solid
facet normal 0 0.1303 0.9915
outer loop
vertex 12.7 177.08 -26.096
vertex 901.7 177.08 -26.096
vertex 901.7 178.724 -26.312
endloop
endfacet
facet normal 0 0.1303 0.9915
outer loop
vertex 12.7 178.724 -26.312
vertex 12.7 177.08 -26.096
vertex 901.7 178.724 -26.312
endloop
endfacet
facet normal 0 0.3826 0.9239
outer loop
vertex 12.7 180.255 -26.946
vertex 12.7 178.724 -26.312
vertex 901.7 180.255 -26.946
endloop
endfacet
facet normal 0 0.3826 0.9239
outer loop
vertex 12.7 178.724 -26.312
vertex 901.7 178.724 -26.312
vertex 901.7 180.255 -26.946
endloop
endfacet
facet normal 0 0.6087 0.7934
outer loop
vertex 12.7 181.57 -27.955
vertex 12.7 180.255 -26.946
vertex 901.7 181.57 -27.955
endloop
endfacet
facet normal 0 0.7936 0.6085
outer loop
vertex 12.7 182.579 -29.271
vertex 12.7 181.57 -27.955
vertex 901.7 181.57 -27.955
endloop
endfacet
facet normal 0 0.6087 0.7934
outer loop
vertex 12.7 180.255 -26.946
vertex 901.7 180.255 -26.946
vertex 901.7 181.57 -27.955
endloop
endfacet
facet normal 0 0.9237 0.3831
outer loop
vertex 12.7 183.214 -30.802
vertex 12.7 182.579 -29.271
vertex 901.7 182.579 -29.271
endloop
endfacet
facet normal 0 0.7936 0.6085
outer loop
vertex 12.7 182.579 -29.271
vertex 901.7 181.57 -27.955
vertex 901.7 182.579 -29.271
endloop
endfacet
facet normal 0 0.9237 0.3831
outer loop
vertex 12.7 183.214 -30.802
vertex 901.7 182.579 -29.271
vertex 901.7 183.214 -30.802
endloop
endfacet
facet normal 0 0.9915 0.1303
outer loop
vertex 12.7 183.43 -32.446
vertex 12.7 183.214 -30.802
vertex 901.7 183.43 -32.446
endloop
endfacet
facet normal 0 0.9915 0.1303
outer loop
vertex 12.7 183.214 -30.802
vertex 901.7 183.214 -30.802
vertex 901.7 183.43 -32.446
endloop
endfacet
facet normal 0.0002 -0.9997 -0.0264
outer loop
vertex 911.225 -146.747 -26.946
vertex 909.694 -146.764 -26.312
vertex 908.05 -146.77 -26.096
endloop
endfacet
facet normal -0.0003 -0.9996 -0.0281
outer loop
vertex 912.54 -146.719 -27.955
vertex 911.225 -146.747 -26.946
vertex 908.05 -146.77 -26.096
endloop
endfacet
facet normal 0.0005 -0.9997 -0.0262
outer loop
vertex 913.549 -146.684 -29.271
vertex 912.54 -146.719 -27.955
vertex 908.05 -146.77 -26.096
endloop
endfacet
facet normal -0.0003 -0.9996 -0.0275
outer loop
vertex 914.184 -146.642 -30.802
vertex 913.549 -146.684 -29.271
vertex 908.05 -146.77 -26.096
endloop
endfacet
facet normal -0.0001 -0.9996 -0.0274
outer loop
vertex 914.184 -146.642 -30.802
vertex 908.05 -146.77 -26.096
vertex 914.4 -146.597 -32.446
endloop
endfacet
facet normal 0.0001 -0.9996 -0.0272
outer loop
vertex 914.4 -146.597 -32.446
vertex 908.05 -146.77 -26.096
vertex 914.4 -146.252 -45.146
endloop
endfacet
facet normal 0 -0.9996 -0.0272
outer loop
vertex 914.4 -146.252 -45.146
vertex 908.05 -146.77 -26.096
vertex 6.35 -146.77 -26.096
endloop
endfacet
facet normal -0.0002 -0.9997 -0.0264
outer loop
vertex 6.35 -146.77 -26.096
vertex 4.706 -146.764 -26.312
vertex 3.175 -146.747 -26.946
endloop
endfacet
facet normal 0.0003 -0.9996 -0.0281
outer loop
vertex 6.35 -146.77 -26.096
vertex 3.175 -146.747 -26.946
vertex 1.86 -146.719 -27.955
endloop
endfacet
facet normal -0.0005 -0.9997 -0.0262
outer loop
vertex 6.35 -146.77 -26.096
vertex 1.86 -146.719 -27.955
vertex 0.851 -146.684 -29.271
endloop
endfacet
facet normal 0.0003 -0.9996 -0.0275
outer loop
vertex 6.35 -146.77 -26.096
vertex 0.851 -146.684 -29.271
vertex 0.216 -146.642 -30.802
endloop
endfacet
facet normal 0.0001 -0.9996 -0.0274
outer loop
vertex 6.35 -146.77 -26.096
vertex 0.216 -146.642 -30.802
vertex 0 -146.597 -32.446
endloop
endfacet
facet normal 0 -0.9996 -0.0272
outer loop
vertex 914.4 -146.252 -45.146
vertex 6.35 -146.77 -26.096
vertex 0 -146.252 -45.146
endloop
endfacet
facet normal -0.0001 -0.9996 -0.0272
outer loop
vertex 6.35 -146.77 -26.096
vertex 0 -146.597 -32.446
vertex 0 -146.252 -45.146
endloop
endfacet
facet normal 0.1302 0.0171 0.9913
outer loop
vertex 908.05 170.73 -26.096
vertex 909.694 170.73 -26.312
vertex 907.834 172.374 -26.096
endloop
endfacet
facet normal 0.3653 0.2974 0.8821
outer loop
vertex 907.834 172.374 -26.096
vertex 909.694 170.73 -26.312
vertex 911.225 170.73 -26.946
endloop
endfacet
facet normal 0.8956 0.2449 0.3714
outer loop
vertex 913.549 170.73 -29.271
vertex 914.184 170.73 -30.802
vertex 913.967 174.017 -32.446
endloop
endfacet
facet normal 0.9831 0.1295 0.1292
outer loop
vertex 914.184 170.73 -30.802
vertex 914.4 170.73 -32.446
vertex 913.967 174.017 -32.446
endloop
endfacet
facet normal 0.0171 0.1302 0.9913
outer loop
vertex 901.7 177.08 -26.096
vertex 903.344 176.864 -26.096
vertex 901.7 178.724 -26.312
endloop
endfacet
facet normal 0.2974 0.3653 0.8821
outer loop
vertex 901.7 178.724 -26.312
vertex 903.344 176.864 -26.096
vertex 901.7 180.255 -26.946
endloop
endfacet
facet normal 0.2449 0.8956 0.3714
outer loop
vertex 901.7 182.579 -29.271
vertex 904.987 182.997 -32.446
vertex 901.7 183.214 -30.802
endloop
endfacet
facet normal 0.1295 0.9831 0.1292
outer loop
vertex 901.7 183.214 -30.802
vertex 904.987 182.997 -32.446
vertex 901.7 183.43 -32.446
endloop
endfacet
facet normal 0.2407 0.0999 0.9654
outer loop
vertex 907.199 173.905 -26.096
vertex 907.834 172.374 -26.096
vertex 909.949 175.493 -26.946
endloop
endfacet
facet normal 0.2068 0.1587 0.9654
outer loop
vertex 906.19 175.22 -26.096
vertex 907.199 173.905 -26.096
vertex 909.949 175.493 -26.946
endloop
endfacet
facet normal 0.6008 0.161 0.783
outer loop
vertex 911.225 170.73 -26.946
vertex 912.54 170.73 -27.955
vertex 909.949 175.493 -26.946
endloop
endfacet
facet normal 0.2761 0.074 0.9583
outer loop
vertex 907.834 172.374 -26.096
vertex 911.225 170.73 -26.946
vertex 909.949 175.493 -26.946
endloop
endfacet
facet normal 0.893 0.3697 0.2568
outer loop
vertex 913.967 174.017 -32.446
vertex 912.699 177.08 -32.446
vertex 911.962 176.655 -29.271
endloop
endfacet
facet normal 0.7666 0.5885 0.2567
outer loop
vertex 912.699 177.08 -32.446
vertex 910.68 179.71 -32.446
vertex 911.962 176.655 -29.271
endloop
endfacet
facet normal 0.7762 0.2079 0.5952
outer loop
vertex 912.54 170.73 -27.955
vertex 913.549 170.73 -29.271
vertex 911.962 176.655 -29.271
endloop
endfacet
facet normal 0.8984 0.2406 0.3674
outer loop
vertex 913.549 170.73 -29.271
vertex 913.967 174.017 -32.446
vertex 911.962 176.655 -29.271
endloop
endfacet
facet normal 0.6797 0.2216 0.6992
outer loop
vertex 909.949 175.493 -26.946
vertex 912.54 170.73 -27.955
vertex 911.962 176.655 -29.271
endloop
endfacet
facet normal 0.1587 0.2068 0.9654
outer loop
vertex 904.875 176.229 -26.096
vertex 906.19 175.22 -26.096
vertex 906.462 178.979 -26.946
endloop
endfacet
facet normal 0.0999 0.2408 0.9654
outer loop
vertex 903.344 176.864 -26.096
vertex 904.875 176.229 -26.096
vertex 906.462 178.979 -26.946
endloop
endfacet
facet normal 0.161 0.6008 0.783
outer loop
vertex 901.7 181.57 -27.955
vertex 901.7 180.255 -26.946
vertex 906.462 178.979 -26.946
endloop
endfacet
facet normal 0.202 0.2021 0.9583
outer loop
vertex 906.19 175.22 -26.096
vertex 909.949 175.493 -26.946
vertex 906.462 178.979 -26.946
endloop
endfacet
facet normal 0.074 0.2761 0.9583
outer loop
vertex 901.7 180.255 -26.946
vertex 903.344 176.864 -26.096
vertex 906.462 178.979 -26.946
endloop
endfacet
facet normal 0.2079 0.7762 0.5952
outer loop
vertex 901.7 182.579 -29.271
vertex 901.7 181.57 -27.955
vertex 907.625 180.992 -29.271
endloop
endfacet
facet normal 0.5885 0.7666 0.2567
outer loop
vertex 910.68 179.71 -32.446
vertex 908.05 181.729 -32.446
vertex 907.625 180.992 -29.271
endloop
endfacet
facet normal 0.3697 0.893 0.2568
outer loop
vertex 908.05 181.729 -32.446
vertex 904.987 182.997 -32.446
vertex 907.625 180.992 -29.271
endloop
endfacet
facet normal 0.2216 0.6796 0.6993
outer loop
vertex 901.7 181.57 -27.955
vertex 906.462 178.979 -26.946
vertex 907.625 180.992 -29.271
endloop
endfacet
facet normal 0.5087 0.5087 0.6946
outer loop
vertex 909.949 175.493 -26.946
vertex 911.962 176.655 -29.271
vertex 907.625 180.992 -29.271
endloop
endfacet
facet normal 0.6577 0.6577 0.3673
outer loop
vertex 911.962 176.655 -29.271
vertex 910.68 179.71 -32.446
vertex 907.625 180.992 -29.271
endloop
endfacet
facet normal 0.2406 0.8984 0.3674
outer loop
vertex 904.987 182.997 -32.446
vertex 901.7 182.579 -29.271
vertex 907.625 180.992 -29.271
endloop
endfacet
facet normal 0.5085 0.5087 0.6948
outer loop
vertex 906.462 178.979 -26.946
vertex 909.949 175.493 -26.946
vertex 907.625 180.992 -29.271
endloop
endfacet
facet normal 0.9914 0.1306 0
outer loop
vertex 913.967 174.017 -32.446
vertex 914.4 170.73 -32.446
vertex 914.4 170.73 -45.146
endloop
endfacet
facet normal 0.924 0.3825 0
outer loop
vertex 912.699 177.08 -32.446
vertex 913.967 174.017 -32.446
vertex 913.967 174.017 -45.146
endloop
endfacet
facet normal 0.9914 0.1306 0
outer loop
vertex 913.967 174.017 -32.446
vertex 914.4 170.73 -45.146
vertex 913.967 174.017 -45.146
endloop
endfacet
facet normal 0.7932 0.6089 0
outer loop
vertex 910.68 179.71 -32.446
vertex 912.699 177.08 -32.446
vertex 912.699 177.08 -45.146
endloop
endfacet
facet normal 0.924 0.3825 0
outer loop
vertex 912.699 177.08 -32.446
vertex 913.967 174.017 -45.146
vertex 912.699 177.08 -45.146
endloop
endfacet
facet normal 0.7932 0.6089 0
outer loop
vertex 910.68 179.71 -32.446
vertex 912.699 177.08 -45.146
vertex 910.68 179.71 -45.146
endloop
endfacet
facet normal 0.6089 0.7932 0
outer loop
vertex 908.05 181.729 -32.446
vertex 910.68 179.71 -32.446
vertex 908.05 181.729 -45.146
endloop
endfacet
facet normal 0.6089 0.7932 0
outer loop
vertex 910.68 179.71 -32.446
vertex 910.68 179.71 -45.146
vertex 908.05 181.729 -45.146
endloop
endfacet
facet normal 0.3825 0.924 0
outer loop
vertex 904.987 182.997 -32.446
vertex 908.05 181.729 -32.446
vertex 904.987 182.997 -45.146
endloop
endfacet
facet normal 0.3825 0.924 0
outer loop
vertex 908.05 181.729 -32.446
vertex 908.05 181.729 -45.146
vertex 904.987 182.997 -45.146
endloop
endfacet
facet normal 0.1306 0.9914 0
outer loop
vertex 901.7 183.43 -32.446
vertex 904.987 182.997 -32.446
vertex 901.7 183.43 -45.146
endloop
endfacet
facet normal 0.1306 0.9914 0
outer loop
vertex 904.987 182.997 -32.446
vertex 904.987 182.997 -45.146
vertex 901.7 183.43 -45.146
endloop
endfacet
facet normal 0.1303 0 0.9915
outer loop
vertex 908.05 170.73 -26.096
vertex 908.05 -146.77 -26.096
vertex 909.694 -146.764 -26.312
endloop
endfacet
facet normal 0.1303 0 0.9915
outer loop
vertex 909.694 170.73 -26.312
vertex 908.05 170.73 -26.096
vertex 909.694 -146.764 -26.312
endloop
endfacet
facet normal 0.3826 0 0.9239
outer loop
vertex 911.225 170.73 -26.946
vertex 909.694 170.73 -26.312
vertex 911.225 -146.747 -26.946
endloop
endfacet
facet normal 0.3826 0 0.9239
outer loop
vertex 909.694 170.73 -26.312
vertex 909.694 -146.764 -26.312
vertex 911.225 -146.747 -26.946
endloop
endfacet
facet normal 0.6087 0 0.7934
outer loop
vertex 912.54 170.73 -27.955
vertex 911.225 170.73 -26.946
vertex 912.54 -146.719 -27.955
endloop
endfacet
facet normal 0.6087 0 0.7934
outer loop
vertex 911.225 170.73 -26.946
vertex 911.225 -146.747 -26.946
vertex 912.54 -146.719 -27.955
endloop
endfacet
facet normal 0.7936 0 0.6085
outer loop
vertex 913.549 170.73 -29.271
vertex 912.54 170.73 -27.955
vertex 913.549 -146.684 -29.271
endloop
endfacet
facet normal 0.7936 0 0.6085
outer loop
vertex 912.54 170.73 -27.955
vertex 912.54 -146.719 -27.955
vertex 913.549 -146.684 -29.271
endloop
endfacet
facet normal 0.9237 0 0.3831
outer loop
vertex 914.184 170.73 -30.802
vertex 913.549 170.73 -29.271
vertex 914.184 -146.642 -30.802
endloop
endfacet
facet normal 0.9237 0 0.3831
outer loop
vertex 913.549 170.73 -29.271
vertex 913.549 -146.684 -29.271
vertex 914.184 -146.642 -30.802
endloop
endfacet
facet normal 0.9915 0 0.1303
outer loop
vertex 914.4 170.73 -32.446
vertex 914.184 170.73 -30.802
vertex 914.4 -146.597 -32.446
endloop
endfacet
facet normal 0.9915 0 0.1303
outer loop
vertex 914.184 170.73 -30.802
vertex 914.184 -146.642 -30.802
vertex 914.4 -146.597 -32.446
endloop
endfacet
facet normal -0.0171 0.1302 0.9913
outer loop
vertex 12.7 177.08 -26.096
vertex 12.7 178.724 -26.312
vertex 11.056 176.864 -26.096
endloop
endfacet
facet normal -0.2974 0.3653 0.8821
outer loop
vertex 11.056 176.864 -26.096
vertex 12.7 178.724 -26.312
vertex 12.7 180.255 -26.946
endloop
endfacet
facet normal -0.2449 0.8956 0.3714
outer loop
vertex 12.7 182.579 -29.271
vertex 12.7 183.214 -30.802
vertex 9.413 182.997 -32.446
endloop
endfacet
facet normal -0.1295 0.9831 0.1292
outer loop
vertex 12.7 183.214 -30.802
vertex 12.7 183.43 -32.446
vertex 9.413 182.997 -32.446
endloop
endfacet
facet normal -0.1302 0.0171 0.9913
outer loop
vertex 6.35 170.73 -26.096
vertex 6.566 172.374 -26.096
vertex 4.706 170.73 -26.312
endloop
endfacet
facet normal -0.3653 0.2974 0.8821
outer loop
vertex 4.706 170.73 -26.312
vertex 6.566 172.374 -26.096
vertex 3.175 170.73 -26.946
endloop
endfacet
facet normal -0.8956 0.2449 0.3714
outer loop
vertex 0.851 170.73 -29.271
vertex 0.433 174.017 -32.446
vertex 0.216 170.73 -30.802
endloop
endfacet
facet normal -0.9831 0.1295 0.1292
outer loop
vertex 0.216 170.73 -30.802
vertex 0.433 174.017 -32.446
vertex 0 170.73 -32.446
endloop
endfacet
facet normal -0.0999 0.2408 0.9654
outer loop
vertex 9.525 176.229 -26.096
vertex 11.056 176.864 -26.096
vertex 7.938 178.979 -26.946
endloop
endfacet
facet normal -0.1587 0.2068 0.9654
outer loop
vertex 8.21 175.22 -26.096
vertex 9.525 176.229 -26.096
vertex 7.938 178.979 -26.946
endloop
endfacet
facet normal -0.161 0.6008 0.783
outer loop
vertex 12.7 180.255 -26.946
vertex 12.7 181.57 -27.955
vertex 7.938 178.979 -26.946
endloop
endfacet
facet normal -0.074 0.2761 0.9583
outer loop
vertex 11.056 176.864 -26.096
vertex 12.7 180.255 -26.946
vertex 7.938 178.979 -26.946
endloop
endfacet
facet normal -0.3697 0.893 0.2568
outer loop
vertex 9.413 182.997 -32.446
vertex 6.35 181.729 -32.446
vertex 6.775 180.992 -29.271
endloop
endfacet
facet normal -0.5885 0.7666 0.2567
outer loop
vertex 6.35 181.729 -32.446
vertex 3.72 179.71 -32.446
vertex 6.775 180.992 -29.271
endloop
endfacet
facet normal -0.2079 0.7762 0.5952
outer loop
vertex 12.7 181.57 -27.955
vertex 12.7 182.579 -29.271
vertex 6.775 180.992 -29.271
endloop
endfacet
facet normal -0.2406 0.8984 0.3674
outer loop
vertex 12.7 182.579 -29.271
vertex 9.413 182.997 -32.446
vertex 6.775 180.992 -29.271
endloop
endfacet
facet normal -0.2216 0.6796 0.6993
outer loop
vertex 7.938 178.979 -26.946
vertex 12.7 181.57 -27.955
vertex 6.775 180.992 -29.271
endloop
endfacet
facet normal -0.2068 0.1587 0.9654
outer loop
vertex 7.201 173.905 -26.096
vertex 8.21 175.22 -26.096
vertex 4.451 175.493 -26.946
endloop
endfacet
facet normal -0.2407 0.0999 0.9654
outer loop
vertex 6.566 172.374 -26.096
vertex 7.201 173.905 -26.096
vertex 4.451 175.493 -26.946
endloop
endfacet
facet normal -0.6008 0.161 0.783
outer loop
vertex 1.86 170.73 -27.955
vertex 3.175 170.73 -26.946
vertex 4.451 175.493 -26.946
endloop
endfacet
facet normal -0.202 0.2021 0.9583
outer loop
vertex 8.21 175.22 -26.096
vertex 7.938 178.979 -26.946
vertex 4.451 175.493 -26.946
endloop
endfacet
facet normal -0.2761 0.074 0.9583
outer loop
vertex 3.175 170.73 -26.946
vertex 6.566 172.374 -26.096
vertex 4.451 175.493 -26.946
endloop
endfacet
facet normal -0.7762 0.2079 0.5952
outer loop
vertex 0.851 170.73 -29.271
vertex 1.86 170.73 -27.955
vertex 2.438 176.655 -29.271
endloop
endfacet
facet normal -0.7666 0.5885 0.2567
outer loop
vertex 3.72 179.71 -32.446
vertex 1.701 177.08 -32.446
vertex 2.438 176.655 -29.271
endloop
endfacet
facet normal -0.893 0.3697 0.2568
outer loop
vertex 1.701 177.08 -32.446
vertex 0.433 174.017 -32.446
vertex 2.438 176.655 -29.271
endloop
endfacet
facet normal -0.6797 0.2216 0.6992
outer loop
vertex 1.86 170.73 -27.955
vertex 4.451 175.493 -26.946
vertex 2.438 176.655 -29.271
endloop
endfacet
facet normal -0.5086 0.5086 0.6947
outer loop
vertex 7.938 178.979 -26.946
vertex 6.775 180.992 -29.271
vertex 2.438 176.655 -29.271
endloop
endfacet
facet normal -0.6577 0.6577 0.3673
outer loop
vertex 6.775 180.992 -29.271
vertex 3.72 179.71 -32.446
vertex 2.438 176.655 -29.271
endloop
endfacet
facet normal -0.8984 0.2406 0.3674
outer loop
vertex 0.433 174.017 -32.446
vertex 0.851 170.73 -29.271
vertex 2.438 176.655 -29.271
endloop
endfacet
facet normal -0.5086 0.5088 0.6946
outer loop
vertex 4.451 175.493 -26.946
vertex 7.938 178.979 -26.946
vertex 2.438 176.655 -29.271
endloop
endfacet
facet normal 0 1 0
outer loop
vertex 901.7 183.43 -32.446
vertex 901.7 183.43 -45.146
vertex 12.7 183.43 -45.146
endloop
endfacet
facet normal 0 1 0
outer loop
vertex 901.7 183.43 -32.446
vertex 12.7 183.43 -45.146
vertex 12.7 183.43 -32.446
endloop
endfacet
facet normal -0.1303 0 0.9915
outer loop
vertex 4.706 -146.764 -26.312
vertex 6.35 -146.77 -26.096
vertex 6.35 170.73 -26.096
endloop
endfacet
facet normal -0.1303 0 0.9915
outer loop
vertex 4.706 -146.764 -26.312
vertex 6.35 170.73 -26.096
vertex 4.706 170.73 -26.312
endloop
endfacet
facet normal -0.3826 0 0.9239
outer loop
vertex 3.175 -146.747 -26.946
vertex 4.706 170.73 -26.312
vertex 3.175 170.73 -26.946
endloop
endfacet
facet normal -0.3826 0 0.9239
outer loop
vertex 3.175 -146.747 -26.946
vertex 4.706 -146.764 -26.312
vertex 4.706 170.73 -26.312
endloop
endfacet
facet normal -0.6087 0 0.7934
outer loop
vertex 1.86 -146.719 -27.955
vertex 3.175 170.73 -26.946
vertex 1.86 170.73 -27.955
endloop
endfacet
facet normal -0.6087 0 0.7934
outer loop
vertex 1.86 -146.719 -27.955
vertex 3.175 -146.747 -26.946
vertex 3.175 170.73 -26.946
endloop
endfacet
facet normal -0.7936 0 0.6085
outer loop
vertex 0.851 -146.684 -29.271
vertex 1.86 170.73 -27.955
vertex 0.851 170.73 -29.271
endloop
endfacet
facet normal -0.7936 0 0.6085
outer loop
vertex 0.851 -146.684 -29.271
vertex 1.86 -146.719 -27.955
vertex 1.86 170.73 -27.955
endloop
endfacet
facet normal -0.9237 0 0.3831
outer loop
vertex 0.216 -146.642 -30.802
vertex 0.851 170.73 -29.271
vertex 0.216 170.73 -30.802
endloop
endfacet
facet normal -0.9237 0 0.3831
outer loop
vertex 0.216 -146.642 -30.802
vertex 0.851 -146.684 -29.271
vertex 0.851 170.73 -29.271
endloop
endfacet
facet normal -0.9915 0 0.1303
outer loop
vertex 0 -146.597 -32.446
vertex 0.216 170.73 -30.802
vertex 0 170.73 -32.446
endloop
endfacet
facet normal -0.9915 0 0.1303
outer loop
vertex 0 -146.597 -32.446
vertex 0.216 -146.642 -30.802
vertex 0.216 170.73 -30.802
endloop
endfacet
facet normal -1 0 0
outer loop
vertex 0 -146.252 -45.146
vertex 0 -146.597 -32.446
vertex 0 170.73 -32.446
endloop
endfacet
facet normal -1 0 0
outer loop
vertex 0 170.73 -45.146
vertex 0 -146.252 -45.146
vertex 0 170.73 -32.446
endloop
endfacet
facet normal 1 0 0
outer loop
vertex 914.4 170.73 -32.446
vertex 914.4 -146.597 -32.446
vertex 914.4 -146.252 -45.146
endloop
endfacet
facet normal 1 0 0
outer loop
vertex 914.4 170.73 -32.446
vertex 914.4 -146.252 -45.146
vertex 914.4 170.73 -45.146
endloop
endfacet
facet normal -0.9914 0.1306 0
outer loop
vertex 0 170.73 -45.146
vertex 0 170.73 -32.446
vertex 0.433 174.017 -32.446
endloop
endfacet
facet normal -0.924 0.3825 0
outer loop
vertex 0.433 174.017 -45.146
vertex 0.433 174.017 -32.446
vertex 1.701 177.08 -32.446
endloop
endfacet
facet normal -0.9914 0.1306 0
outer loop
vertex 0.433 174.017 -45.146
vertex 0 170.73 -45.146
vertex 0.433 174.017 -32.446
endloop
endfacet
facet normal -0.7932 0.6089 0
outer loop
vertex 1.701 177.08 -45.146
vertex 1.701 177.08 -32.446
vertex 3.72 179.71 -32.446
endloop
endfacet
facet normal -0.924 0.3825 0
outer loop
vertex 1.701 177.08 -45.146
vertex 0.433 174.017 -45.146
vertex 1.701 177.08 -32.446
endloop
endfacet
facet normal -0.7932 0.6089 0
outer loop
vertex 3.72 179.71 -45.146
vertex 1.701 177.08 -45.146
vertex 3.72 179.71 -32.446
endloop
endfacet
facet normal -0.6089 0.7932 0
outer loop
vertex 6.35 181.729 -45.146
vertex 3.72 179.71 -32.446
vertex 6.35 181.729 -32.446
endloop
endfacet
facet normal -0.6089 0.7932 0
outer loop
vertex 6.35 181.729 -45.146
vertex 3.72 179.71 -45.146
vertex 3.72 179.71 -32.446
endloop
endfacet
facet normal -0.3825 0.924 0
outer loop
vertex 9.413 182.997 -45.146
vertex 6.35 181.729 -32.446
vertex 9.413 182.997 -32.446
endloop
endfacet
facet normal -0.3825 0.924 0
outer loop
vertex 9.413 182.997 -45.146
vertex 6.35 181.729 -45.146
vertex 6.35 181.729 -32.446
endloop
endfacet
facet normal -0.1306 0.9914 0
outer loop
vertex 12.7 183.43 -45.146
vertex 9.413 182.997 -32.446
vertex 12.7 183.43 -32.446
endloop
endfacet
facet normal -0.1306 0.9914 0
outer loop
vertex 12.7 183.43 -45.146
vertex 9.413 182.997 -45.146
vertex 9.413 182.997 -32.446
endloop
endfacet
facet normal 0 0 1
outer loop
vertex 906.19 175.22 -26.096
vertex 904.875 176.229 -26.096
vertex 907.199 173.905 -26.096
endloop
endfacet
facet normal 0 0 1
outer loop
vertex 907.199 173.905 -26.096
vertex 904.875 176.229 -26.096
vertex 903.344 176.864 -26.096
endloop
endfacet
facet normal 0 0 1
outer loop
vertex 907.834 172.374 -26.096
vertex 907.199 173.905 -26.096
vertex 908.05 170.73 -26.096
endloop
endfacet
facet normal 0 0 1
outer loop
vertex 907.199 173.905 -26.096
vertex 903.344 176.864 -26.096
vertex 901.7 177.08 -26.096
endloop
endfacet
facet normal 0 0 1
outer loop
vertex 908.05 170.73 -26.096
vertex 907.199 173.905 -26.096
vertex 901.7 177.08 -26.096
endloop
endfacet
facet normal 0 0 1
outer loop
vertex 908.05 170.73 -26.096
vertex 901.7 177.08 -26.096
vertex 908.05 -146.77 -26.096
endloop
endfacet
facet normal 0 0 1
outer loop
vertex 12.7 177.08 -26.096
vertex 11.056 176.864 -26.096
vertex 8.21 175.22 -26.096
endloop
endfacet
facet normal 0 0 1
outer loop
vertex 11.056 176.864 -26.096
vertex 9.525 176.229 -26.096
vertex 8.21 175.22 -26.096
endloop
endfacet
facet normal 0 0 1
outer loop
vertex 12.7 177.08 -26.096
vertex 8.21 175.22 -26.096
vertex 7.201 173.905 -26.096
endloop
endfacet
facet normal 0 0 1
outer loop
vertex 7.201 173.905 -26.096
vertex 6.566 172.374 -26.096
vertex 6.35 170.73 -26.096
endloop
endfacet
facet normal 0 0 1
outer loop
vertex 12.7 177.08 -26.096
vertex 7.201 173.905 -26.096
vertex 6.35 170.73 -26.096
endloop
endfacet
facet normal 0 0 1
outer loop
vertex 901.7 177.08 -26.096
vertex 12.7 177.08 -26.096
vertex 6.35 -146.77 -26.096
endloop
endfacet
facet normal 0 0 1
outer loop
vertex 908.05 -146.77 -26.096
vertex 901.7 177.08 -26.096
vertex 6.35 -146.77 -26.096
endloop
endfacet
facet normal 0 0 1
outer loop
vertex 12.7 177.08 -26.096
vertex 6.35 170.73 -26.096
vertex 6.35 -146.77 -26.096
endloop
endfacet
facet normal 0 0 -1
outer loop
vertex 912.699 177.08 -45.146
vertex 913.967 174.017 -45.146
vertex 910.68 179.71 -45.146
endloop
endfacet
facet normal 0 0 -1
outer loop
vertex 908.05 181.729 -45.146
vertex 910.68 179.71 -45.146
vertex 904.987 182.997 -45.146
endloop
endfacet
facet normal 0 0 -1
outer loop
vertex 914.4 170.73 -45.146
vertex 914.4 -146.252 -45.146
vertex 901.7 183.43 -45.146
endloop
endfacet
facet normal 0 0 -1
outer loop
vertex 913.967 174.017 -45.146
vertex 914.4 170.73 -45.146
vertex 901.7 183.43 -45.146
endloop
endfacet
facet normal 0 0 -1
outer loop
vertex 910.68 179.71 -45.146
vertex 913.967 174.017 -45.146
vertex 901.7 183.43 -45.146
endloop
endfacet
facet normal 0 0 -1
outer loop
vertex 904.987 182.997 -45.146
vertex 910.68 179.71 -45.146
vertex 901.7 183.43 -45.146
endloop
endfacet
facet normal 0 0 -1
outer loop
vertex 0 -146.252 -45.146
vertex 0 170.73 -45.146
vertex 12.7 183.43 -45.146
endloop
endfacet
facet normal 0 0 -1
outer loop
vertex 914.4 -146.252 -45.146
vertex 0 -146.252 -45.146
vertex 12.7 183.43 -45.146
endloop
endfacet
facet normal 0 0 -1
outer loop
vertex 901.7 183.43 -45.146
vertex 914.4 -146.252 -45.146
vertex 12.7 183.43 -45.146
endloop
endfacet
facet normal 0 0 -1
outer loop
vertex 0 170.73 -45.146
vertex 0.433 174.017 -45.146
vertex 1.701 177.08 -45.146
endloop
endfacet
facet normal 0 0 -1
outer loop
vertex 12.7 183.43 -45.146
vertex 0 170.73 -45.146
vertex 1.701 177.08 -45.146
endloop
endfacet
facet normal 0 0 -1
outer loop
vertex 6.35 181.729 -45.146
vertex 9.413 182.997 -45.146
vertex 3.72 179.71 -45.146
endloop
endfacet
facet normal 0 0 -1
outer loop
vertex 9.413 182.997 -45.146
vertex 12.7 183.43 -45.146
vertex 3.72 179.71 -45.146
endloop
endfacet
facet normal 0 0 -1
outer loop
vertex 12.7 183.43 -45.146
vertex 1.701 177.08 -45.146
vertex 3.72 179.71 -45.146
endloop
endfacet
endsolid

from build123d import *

# Parameters (mm, degrees)
F1_DEPTH    = 914.4
F2_R        = 6.35
F3_T1_DEPTH = 50.8
F3_T4_ANGLE = 90
F3_T6_ANGLE = 90


# Not quite as in the source:
# - a fillet or chamfer that OpenCascade refuses, or shapes differently, is made with other operations: its cross-section is extruded or revolved along the edge and cut away or added


with BuildPart() as f1:
    # F0 (on Right) → F1 (new body)
    with BuildSketch(Plane.YZ):
        Polygon((183.430065248, -26.0955506578), (-146.769934752, -26.0955506578), (-146.2517950619, -45.1455506578), (183.430065248, -45.1455506578), align=None)
    extrude(amount=F1_DEPTH)

    # F2
    f2_edges = [f1.edges().sort_by_distance(p)[0] for p in [
        (0, 18.330065, -26.095551),
        (457.2, 183.430065, -26.095551),
        (914.4, 18.330065, -26.095551),
    ]]
    fillet(f2_edges, radius=F2_R)

    # F3: fillet of radius 12.7 on 2 edges, made by hand

    # F3_s2 → F3_t1 (cut)
    with BuildSketch(Plane.XY.offset(-76.8955506578)):
        with BuildLine():
            ThreePointArc((914.4, 170.730065248), (910.6802561211, 179.710321369), (901.7, 183.430065248))
            Line((901.7, 183.430065248), (914.4, 183.430065248))
            Line((914.4, 183.430065248), (914.4, 170.730065248))
        make_face()
        with BuildLine():
            ThreePointArc((0, 170.730065248), (3.7197438789, 179.710321369), (12.7, 183.430065248))
            Line((12.7, 183.430065248), (0, 183.430065248))
            Line((0, 183.430065248), (0, 170.730065248))
        make_face()
    extrude(amount=F3_T1_DEPTH, mode=Mode.SUBTRACT)

    # F3_s3 → F3_t4 (revolve, cut)
    with BuildSketch(Plane.YZ.offset(12.7)):
        with BuildLine():
            ThreePointArc((177.080065248, -26.0955506578), (181.5701933085, -27.9554225973), (183.430065248, -32.4455506578))
            Line((183.430065248, -32.4455506578), (183.430065248, -26.0955506578))
            Line((183.430065248, -26.0955506578), (177.080065248, -26.0955506578))
        make_face()
    revolve(axis=Axis((12.7, 170.730065248, -26.0955506578), (0, 0, 1)), revolution_arc=F3_T4_ANGLE, mode=Mode.SUBTRACT)

    # F3_s5 → F3_t6 (revolve, cut)
    with BuildSketch(Plane.XZ.offset(-170.730065248)):
        with BuildLine():
            ThreePointArc((908.05, -26.0955506578), (912.5401280605, -27.9554225973), (914.4, -32.4455506578))
            Line((914.4, -32.4455506578), (914.4, -26.0955506578))
            Line((914.4, -26.0955506578), (908.05, -26.0955506578))
        make_face()
    revolve(axis=Axis((901.7, 170.730065248, -26.0955506578), (0, 0, 1)), revolution_arc=F3_T6_ANGLE, mode=Mode.SUBTRACT)


solid = f1.part
